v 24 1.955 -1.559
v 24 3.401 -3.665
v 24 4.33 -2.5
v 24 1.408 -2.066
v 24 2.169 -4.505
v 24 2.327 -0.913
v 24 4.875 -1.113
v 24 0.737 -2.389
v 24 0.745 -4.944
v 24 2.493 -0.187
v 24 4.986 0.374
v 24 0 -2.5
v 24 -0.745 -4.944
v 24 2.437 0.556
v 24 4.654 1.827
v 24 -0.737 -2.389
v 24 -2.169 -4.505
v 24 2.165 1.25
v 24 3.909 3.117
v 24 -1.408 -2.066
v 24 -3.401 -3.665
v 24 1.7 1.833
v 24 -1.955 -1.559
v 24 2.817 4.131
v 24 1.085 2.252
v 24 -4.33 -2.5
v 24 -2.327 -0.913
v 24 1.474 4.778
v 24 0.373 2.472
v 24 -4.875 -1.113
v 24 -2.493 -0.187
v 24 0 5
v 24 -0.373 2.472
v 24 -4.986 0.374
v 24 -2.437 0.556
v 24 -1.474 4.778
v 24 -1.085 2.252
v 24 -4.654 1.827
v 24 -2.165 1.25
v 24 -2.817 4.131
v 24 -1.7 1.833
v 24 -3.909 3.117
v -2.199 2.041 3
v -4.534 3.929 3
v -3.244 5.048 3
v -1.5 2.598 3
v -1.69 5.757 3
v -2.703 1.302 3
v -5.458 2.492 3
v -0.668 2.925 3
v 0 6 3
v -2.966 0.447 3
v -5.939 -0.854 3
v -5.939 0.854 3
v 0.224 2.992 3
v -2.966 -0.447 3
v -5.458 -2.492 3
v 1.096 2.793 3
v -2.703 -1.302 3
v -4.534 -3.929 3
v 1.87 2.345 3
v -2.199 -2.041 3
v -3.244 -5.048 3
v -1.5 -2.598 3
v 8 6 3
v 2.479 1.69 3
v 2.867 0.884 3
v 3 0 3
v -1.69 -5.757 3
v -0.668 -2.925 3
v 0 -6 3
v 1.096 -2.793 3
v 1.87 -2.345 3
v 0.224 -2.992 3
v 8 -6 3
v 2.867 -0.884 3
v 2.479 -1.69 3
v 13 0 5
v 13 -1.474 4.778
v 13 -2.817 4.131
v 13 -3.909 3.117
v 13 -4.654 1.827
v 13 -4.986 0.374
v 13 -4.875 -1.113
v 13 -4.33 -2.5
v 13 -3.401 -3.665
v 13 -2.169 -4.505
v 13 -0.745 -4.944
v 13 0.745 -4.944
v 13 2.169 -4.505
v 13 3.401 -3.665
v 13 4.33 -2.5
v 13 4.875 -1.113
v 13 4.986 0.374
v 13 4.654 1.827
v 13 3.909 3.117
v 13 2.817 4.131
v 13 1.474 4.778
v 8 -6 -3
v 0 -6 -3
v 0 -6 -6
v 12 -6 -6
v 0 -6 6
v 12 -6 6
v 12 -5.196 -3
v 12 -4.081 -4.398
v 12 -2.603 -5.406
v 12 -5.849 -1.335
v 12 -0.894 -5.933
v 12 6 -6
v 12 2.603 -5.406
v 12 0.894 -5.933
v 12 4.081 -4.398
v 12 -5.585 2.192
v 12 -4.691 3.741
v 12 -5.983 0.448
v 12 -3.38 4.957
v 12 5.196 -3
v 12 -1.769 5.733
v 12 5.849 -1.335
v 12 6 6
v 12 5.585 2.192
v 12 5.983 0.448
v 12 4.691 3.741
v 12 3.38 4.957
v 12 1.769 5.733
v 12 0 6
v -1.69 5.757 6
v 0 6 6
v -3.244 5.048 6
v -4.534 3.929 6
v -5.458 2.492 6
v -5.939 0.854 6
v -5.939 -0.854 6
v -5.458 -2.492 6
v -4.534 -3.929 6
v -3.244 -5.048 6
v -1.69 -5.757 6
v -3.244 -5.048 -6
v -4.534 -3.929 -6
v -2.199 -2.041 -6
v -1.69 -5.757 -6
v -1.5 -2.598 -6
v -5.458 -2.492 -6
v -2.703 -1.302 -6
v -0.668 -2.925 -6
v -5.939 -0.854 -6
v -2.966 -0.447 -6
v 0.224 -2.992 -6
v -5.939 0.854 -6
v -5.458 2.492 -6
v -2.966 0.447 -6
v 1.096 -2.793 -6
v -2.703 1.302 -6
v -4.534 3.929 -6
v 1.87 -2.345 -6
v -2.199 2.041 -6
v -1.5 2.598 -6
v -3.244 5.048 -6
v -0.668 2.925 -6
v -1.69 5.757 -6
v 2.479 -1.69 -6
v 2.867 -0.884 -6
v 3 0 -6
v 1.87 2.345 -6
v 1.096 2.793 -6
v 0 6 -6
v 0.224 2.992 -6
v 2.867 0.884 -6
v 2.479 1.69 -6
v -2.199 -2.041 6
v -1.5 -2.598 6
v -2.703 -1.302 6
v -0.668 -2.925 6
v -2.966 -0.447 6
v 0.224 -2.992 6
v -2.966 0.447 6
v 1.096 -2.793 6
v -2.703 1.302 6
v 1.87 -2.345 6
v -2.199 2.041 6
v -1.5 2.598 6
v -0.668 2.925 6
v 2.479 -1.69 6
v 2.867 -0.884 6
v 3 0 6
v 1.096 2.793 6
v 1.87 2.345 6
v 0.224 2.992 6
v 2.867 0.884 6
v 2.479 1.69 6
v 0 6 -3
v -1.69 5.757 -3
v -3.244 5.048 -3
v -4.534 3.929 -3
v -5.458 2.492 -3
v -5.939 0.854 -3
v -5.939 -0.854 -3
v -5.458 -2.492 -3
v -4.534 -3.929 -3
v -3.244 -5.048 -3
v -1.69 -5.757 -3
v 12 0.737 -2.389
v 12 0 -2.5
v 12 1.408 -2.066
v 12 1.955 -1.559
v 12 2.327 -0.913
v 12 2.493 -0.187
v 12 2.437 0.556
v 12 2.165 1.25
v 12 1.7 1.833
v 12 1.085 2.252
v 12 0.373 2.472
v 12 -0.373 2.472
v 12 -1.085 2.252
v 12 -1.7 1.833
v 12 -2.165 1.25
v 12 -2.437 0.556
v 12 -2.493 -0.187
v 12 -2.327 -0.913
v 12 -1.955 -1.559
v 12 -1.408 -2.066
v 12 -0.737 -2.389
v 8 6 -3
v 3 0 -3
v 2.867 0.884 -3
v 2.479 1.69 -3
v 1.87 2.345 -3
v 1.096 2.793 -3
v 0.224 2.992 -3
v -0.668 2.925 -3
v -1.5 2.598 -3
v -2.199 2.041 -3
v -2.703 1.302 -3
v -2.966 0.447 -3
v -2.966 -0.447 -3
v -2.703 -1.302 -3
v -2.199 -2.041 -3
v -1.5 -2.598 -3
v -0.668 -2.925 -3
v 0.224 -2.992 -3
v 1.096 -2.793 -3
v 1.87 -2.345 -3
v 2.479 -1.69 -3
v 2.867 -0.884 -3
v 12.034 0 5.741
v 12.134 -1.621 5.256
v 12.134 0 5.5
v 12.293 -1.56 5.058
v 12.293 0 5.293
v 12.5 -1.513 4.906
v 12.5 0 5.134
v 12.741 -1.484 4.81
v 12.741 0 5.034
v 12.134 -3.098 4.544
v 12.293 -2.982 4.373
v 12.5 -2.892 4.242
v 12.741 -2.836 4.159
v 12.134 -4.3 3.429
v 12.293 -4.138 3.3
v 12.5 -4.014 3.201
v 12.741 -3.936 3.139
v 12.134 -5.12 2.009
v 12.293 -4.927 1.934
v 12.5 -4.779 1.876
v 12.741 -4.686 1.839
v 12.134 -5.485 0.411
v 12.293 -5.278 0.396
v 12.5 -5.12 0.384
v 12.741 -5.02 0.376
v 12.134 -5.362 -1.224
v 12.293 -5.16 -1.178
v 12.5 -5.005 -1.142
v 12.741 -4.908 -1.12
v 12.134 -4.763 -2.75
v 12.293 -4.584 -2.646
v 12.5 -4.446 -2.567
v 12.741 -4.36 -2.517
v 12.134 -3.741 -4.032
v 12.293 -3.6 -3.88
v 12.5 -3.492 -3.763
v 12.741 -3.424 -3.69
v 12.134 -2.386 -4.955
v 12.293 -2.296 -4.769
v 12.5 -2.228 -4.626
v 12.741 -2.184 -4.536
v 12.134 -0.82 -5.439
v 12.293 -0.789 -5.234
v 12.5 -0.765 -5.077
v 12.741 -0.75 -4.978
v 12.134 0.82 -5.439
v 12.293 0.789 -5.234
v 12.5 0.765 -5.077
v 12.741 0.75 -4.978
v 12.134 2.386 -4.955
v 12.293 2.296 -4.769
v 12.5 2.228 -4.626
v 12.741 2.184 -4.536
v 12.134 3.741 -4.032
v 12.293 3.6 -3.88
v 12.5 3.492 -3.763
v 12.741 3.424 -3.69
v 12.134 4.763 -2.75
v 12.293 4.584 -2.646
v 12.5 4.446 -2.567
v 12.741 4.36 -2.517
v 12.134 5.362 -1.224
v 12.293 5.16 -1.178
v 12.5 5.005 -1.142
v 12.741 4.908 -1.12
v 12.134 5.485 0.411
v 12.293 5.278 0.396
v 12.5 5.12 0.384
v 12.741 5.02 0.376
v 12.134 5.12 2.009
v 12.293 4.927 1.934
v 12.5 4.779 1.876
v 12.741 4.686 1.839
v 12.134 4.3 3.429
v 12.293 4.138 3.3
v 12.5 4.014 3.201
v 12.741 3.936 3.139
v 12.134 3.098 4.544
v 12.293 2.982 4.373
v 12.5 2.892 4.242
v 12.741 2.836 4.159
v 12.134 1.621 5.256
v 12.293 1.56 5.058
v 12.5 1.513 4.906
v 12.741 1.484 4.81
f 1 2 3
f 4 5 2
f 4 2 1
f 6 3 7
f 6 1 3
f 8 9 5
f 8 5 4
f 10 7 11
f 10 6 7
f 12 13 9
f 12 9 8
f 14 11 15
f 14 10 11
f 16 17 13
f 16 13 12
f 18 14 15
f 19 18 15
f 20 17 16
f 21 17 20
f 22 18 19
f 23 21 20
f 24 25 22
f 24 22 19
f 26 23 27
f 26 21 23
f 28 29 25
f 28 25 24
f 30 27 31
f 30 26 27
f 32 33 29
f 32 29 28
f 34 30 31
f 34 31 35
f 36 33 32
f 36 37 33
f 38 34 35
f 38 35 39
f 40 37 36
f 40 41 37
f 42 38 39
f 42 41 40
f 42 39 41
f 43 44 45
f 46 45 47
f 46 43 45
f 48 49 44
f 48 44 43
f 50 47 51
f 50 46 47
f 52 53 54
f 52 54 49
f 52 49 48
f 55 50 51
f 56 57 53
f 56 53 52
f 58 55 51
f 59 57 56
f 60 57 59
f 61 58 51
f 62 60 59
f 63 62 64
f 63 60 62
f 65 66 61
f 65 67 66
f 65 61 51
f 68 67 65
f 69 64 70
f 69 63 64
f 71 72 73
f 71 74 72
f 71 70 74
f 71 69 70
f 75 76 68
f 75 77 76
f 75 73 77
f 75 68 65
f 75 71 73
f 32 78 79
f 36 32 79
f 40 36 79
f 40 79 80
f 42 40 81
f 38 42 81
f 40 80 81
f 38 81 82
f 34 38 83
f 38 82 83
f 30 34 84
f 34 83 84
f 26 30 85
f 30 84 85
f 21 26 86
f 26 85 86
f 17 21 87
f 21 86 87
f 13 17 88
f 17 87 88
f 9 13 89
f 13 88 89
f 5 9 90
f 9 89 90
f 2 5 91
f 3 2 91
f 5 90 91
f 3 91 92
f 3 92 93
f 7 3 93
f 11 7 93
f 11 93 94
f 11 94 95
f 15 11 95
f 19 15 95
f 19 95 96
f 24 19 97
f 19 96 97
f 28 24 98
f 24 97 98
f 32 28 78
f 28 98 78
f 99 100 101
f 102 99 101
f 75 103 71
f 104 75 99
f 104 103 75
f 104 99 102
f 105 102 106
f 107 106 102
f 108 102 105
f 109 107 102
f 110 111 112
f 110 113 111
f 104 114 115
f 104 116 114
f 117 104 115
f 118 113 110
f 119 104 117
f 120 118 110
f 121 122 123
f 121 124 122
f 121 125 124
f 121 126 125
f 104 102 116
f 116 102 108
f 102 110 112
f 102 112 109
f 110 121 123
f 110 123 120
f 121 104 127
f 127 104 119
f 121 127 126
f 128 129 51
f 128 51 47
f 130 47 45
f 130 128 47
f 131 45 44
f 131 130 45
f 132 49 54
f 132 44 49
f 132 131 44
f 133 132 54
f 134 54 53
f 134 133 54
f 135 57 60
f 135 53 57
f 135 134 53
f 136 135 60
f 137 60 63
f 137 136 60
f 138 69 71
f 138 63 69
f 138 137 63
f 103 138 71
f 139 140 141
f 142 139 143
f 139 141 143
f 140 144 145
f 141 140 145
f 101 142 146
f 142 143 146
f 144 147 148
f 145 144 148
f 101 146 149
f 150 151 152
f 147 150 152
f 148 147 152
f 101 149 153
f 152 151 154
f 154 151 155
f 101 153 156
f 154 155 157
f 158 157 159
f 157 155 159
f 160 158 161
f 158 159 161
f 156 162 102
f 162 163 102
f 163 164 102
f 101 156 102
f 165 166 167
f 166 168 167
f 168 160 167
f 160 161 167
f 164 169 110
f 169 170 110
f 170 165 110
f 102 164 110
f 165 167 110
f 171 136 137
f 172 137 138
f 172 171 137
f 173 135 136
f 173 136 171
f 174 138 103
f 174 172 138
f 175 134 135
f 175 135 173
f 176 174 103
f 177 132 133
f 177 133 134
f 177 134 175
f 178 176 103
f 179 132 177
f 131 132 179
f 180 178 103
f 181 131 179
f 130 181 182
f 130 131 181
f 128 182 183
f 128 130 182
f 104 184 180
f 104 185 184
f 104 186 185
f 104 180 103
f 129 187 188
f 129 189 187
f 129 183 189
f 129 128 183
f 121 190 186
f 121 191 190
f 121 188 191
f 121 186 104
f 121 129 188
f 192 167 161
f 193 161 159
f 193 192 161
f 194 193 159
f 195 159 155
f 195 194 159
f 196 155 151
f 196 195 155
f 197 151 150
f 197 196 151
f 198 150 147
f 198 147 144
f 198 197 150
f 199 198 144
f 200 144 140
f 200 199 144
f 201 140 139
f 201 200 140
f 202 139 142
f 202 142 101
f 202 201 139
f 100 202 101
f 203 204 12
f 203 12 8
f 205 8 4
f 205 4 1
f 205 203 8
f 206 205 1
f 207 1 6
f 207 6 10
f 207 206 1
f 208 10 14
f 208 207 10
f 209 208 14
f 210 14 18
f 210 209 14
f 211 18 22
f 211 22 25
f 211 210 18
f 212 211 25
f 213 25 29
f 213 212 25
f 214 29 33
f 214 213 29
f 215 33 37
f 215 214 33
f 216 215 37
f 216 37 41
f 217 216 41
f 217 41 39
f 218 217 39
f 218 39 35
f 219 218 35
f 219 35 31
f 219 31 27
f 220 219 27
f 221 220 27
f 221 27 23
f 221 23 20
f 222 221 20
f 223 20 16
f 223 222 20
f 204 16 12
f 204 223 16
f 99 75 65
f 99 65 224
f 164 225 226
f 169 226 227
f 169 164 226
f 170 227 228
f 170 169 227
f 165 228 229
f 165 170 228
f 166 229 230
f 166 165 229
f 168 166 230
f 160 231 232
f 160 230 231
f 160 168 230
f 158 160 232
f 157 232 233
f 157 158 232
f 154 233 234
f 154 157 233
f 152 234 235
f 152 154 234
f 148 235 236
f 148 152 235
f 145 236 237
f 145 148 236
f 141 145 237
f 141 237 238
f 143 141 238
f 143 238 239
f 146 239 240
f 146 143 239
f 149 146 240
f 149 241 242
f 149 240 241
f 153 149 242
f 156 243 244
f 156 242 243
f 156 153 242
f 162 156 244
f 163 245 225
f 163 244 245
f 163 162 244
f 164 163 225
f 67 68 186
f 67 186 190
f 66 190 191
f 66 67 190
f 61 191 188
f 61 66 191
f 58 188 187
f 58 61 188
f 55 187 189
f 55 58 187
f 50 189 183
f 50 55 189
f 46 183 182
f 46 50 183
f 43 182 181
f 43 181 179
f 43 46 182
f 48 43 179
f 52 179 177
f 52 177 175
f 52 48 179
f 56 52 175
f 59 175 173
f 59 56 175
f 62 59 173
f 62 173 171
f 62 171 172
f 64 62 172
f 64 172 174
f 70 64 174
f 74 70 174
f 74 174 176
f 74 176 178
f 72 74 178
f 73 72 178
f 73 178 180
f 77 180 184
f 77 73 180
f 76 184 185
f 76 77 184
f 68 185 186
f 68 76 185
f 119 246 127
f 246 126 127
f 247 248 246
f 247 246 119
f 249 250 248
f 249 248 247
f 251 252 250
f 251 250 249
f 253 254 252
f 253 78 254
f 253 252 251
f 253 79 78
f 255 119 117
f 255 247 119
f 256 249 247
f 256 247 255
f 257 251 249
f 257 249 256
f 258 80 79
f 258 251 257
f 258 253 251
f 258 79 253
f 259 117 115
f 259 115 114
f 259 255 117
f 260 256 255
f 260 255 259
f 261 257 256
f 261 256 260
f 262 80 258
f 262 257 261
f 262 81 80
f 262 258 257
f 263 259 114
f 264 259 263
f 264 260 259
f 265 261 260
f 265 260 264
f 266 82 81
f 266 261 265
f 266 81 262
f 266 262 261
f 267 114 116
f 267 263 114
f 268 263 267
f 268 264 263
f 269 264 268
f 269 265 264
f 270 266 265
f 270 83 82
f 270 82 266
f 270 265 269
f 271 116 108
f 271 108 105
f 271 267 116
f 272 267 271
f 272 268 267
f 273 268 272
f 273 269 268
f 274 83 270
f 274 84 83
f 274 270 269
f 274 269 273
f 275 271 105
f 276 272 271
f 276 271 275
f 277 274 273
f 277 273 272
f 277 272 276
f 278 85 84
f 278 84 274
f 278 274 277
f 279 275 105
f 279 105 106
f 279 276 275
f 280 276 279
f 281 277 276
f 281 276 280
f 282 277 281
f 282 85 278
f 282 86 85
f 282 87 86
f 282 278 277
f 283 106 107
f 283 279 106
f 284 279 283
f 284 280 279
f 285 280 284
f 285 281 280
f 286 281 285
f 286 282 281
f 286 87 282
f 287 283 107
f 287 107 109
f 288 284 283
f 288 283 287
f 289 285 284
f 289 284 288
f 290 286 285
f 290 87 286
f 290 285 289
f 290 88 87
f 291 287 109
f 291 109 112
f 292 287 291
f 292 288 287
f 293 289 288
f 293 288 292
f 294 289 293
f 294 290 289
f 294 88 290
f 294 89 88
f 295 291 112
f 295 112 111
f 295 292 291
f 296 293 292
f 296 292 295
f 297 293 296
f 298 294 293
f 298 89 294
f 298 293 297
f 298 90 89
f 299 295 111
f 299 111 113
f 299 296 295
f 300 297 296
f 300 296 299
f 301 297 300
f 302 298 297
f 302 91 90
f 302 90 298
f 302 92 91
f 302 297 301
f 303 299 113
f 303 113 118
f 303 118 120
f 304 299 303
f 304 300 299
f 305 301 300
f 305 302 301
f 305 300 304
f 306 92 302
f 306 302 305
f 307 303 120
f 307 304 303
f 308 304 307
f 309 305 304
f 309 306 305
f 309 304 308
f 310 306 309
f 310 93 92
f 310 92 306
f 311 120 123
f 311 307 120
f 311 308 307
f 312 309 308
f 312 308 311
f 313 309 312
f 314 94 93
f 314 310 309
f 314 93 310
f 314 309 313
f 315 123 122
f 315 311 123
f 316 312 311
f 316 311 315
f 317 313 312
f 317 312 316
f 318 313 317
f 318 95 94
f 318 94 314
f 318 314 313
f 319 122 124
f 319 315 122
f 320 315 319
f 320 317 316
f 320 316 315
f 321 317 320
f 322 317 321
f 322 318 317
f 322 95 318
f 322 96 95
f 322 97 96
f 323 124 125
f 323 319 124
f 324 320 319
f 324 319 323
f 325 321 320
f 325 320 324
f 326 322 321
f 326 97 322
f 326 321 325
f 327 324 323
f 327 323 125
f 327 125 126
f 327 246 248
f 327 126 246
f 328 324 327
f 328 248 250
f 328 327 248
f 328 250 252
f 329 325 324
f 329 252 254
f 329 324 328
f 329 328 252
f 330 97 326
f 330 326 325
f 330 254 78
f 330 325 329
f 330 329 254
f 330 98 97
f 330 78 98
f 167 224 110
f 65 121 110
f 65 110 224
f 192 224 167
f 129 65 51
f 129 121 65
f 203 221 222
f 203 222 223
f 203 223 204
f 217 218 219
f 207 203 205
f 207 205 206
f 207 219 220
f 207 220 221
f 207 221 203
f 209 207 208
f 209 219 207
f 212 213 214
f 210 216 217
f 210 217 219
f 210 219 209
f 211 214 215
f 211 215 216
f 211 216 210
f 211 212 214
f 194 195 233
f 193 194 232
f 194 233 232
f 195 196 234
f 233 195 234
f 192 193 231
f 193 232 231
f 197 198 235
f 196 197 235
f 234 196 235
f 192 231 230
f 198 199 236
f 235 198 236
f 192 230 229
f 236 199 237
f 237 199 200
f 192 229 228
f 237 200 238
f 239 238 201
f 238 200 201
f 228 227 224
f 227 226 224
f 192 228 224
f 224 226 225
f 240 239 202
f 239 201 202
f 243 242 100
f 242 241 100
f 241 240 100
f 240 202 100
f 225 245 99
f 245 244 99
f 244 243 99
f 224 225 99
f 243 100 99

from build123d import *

# Parameters (mm, degrees)
SKETCH1_R               = 3
BOSS_EXTRUDE1_DEPTH     = 6
CUT_EXTRUDE1_DEPTH      = 15.696938457
CUT_EXTRUDE1_DEPTH_BACK = 15.696938457
SKETCH2_W               = 14
SKETCH2_H               = 6
SKETCH3_R               = 5
SKETCH3_R_2             = 2.5
BOSS_EXTRUDE2_DEPTH     = 12
FILLET1_R               = 1


with BuildPart() as part:
    # Sketch1 → Boss-Extrude1 (new, symmetric)
    with BuildSketch(Plane.XY):
        with BuildLine():
            Line((0, -6), (12, -6))
            Line((12, -6), (12, 6))
            Line((12, 6), (0, 6))
            ThreePointArc((0, 6), (-6, 0), (0, -6))
        make_face()
        Circle(SKETCH1_R, mode=Mode.SUBTRACT)
    extrude(amount=BOSS_EXTRUDE1_DEPTH, both=True)

    # Sketch2 → Cut-Extrude1 (cut, two sides: drawn at the far end of the back side and taken through both)
    with BuildSketch(Plane(origin=(0, 0, 0), x_dir=(1, 0, 0), z_dir=(0, 1, 0)).offset(-CUT_EXTRUDE1_DEPTH_BACK)):
        with Locations((1, 0)):
            Rectangle(SKETCH2_W, SKETCH2_H)
    extrude(amount=CUT_EXTRUDE1_DEPTH + CUT_EXTRUDE1_DEPTH_BACK, mode=Mode.SUBTRACT)

    # Sketch3 → Boss-Extrude2 (add)
    with BuildSketch(Plane(origin=(12, 0, 0), x_dir=(0, 0, -1), z_dir=(1, 0, 0))):
        with Locations(Location((0, 0, 0), (0, 0, 180))):
            Circle(SKETCH3_R)
        Circle(SKETCH3_R_2, mode=Mode.SUBTRACT)
    extrude(amount=BOSS_EXTRUDE2_DEPTH)

    # Fillet1
    fillet1_edges = [part.edges().sort_by_distance(p)[0] for p in [
        (12, 0, -5),
    ]]
    fillet(fillet1_edges, radius=FILLET1_R - 0.0001)  # a hair under: the kernel refuses the full size


solid = part.part
